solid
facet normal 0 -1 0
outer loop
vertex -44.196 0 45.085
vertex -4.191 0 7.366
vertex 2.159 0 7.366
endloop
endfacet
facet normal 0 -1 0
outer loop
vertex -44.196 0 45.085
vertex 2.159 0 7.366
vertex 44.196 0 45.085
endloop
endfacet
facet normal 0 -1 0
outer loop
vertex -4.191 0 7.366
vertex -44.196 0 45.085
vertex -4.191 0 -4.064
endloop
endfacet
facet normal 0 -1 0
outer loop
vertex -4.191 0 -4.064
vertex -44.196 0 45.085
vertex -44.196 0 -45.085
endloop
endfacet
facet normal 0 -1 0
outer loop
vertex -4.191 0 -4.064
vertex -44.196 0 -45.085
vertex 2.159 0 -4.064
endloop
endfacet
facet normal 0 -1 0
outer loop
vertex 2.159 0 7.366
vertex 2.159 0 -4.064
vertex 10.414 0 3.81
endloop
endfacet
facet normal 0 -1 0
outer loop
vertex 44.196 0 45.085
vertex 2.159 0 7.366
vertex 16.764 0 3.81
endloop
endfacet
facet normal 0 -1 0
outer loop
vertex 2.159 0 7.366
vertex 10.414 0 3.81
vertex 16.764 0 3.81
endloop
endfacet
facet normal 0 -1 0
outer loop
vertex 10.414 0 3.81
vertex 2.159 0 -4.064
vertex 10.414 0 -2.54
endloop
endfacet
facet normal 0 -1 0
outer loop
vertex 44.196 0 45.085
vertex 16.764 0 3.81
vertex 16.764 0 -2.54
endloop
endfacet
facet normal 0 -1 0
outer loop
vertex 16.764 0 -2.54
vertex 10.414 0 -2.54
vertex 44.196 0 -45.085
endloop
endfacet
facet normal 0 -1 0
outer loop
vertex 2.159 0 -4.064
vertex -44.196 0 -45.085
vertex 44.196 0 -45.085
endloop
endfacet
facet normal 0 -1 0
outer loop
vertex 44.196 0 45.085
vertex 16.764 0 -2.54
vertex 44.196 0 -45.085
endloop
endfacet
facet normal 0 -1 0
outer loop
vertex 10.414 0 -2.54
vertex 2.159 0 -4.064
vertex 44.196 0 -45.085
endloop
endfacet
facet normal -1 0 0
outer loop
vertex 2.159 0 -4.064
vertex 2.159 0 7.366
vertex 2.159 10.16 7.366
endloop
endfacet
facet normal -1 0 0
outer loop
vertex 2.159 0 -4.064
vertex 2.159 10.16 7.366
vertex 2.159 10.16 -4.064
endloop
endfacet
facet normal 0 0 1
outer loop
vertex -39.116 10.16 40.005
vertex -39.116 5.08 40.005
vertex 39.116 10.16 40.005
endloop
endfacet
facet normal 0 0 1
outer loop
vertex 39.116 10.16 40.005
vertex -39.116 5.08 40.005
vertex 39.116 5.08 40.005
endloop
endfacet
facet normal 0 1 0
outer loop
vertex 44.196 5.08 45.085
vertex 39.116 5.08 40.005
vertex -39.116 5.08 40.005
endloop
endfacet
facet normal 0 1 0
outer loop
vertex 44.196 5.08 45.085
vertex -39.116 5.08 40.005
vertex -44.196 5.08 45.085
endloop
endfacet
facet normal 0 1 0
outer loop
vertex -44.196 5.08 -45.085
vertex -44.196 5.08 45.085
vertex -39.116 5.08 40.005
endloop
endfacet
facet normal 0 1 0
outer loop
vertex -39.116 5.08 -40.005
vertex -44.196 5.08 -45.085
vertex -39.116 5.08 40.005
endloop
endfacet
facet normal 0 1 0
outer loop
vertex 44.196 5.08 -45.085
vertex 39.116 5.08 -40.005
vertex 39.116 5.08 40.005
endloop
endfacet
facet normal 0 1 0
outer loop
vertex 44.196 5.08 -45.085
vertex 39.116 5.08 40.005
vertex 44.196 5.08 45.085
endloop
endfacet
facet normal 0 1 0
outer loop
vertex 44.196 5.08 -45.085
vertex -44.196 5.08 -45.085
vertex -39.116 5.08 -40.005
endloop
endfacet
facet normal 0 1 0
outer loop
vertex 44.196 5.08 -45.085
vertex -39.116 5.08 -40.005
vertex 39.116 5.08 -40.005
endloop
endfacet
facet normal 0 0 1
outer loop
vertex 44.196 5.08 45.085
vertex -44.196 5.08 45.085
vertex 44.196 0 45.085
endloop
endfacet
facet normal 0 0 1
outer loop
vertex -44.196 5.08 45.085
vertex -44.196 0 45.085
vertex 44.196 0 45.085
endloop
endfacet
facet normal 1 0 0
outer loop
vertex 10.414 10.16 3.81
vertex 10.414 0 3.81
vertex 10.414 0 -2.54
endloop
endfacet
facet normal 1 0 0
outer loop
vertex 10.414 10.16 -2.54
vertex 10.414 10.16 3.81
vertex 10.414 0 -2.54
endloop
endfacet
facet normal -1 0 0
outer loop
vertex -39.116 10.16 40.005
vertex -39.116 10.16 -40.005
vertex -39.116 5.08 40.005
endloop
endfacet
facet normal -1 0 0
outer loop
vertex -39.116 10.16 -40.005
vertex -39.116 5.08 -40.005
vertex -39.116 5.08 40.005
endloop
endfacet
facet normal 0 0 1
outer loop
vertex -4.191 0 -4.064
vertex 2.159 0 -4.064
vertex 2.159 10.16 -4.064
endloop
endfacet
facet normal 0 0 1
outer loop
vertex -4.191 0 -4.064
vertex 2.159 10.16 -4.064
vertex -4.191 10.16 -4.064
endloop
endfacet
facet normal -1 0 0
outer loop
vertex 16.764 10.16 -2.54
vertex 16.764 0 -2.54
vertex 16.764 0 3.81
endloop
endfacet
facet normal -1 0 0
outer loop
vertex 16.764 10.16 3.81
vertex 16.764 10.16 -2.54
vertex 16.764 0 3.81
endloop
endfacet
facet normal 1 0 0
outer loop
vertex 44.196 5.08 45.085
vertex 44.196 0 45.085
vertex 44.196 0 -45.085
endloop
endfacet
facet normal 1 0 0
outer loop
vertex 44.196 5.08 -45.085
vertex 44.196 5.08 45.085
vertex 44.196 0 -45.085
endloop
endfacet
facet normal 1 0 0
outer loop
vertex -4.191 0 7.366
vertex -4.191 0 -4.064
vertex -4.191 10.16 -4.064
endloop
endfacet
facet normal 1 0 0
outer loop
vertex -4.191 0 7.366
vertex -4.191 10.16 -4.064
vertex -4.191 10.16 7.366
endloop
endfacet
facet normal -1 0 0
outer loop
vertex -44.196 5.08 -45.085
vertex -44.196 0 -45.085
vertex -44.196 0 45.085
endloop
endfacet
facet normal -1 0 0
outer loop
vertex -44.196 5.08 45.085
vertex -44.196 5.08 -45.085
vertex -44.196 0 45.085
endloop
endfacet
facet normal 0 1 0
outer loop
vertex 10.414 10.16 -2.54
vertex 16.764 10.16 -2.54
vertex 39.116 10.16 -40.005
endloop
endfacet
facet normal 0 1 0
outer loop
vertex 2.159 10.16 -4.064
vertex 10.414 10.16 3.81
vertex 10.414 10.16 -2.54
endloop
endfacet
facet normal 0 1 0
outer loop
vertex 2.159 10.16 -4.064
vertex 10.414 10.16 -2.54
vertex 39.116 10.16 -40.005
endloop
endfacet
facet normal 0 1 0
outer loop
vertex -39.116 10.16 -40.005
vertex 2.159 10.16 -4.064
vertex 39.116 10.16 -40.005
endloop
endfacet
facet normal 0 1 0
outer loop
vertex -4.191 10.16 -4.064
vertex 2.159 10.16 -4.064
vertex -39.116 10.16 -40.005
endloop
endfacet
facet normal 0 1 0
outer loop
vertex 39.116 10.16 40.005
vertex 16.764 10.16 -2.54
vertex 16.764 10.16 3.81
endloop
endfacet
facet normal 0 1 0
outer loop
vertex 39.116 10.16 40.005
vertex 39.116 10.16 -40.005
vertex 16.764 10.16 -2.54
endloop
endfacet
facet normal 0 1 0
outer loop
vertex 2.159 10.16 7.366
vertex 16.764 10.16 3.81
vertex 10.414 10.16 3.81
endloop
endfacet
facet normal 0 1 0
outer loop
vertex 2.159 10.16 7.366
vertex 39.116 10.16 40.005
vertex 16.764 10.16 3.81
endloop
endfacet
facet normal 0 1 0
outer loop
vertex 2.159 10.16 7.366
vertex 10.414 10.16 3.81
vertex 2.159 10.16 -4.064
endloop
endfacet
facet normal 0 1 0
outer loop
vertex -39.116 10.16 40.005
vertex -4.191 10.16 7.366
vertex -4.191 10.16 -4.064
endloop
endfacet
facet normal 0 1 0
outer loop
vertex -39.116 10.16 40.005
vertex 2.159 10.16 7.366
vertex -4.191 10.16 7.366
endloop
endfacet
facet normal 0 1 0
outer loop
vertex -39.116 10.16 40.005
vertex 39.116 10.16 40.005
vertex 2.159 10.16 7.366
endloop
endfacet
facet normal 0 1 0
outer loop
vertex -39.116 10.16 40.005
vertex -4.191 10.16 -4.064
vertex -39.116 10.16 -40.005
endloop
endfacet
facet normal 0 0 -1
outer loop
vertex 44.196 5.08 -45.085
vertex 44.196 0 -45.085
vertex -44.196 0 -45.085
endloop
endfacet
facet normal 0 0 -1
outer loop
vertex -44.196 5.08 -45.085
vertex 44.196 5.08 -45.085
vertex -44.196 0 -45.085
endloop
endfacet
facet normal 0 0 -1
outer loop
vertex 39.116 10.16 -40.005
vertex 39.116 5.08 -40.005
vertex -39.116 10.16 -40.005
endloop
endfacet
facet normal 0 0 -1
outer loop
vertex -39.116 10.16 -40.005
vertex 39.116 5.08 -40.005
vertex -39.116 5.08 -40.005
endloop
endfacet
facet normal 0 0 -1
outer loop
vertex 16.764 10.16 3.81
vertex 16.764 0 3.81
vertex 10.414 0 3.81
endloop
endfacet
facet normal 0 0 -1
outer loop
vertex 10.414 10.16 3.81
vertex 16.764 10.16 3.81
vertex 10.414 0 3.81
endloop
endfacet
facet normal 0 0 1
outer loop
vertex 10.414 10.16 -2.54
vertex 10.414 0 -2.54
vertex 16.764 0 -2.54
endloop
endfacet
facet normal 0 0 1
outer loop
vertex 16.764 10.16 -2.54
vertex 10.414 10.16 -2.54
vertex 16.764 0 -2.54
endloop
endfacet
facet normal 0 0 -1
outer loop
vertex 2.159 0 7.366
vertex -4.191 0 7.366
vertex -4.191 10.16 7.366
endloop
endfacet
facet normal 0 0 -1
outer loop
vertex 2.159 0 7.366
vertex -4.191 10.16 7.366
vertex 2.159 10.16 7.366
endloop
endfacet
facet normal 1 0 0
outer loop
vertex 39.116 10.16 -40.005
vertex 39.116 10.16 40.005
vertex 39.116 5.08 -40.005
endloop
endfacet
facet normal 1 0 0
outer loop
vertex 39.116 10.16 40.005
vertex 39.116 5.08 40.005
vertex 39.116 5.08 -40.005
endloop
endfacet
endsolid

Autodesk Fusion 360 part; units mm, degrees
sketch "Sketch1" plane through (0, 0, 0) normal (0, 1, 0) x (1, 0, 0) in component "Lid"
  line L0 (44.196, 45.085) -> (-44.196, 45.085)
  line L1 (-44.196, 45.085) -> (-44.196, -45.085)
  line L2 (-44.196, -45.085) -> (44.196, -45.085)
  line L3 (44.196, -45.085) -> (44.196, 45.085)
  line L4 (44.196, 45.085) -> (-44.196, -45.085) construction
  line L5 (-44.196, 45.085) -> (44.196, -45.085) construction
  dimension "d1" = 88.392
  dimension "d2" = 90.17
extrude "Extrude1" add sketch "Sketch1" along normal blind 5.08 in component "Lid"
sketch "Sketch3" plane through (0, 5.08, 0) normal (0, 1, 0) x (-1, 0, 0) in component "Lid"
  line L0 (-44.196, 45.085) -> (-44.196, -45.085)
  line L1 (-44.196, -45.085) -> (44.196, -45.085)
  line L2 (44.196, -45.085) -> (44.196, 45.085)
  line L3 (44.196, 45.085) -> (-44.196, 45.085)
  line L4 (-39.116, -40.005) -> (39.116, -40.005)
  line L5 (39.116, -40.005) -> (39.116, 40.005)
  line L6 (39.116, 40.005) -> (-39.116, 40.005)
  line L7 (-39.116, 40.005) -> (-39.116, -40.005)
  line L8 (-39.116, -40.005) -> (39.116, 40.005) construction
  line L9 (39.116, -40.005) -> (-39.116, 40.005) construction
  dimension "d6" = 78.232
  dimension "d7" = 80.01
extrude "Extrude2" add sketch "Sketch3" along normal blind 5.08 contours L4 L5 L6 L7 in component "Lid"
sketch "Sketch6" plane through (0, 0, 0) normal (0, -1, 0) x (1, 0, 0) in component "Lid"
  line L0 (44.196, -45.085) -> (44.196, 45.085)
  line L1 (44.196, 45.085) -> (-44.196, 45.085)
  line L2 (-44.196, 45.085) -> (-44.196, -45.085)
  line L3 (-44.196, -45.085) -> (44.196, -45.085)
  line L4 (2.159, -4.064) -> (-4.191, -4.064)
  line L5 (-4.191, -4.064) -> (-4.191, 7.366)
  line L6 (-4.191, 7.366) -> (2.159, 7.366)
  line L7 (2.159, 7.366) -> (2.159, -4.064)
  line L8 (2.159, -4.064) -> (-4.191, 7.366) construction
  line L9 (-4.191, -4.064) -> (2.159, 7.366) construction
  dimension "d14" = 11.43
  dimension "d15" = 6.35
  dimension "d16" = 1.016
  dimension "d18" = 1.651
extrude "Extrude3" cut sketch "Sketch6" against normal blind 10.16 contours L4 L5 L6 L7 in component "Lid"
sketch "Sketch9" plane through (0, 0, 0) normal (0, 1, 0) x (1, 0, 0) in component "Lid"
  line L0 (16.764, -3.81) -> (10.414, -3.81)
  line L1 (10.414, -3.81) -> (10.414, 2.54)
  line L2 (10.414, 2.54) -> (16.764, 2.54)
  line L3 (16.764, 2.54) -> (16.764, -3.81)
  line L4 (16.764, -3.81) -> (10.414, 2.54) construction
  line L5 (10.414, -3.81) -> (16.764, 2.54) construction
  dimension "d28" = 6.35
  dimension "d29" = 6.35
  dimension "d30" = 0.635
  dimension "d31" = 13.589
extrude "Extrude5" cut sketch "Sketch9" along normal blind 10.16 in component "Lid"
component "Lid" placed x (1, 0, 0) y (0, 1, 0) z (0, 0, 1) at (0, 0, 0)
